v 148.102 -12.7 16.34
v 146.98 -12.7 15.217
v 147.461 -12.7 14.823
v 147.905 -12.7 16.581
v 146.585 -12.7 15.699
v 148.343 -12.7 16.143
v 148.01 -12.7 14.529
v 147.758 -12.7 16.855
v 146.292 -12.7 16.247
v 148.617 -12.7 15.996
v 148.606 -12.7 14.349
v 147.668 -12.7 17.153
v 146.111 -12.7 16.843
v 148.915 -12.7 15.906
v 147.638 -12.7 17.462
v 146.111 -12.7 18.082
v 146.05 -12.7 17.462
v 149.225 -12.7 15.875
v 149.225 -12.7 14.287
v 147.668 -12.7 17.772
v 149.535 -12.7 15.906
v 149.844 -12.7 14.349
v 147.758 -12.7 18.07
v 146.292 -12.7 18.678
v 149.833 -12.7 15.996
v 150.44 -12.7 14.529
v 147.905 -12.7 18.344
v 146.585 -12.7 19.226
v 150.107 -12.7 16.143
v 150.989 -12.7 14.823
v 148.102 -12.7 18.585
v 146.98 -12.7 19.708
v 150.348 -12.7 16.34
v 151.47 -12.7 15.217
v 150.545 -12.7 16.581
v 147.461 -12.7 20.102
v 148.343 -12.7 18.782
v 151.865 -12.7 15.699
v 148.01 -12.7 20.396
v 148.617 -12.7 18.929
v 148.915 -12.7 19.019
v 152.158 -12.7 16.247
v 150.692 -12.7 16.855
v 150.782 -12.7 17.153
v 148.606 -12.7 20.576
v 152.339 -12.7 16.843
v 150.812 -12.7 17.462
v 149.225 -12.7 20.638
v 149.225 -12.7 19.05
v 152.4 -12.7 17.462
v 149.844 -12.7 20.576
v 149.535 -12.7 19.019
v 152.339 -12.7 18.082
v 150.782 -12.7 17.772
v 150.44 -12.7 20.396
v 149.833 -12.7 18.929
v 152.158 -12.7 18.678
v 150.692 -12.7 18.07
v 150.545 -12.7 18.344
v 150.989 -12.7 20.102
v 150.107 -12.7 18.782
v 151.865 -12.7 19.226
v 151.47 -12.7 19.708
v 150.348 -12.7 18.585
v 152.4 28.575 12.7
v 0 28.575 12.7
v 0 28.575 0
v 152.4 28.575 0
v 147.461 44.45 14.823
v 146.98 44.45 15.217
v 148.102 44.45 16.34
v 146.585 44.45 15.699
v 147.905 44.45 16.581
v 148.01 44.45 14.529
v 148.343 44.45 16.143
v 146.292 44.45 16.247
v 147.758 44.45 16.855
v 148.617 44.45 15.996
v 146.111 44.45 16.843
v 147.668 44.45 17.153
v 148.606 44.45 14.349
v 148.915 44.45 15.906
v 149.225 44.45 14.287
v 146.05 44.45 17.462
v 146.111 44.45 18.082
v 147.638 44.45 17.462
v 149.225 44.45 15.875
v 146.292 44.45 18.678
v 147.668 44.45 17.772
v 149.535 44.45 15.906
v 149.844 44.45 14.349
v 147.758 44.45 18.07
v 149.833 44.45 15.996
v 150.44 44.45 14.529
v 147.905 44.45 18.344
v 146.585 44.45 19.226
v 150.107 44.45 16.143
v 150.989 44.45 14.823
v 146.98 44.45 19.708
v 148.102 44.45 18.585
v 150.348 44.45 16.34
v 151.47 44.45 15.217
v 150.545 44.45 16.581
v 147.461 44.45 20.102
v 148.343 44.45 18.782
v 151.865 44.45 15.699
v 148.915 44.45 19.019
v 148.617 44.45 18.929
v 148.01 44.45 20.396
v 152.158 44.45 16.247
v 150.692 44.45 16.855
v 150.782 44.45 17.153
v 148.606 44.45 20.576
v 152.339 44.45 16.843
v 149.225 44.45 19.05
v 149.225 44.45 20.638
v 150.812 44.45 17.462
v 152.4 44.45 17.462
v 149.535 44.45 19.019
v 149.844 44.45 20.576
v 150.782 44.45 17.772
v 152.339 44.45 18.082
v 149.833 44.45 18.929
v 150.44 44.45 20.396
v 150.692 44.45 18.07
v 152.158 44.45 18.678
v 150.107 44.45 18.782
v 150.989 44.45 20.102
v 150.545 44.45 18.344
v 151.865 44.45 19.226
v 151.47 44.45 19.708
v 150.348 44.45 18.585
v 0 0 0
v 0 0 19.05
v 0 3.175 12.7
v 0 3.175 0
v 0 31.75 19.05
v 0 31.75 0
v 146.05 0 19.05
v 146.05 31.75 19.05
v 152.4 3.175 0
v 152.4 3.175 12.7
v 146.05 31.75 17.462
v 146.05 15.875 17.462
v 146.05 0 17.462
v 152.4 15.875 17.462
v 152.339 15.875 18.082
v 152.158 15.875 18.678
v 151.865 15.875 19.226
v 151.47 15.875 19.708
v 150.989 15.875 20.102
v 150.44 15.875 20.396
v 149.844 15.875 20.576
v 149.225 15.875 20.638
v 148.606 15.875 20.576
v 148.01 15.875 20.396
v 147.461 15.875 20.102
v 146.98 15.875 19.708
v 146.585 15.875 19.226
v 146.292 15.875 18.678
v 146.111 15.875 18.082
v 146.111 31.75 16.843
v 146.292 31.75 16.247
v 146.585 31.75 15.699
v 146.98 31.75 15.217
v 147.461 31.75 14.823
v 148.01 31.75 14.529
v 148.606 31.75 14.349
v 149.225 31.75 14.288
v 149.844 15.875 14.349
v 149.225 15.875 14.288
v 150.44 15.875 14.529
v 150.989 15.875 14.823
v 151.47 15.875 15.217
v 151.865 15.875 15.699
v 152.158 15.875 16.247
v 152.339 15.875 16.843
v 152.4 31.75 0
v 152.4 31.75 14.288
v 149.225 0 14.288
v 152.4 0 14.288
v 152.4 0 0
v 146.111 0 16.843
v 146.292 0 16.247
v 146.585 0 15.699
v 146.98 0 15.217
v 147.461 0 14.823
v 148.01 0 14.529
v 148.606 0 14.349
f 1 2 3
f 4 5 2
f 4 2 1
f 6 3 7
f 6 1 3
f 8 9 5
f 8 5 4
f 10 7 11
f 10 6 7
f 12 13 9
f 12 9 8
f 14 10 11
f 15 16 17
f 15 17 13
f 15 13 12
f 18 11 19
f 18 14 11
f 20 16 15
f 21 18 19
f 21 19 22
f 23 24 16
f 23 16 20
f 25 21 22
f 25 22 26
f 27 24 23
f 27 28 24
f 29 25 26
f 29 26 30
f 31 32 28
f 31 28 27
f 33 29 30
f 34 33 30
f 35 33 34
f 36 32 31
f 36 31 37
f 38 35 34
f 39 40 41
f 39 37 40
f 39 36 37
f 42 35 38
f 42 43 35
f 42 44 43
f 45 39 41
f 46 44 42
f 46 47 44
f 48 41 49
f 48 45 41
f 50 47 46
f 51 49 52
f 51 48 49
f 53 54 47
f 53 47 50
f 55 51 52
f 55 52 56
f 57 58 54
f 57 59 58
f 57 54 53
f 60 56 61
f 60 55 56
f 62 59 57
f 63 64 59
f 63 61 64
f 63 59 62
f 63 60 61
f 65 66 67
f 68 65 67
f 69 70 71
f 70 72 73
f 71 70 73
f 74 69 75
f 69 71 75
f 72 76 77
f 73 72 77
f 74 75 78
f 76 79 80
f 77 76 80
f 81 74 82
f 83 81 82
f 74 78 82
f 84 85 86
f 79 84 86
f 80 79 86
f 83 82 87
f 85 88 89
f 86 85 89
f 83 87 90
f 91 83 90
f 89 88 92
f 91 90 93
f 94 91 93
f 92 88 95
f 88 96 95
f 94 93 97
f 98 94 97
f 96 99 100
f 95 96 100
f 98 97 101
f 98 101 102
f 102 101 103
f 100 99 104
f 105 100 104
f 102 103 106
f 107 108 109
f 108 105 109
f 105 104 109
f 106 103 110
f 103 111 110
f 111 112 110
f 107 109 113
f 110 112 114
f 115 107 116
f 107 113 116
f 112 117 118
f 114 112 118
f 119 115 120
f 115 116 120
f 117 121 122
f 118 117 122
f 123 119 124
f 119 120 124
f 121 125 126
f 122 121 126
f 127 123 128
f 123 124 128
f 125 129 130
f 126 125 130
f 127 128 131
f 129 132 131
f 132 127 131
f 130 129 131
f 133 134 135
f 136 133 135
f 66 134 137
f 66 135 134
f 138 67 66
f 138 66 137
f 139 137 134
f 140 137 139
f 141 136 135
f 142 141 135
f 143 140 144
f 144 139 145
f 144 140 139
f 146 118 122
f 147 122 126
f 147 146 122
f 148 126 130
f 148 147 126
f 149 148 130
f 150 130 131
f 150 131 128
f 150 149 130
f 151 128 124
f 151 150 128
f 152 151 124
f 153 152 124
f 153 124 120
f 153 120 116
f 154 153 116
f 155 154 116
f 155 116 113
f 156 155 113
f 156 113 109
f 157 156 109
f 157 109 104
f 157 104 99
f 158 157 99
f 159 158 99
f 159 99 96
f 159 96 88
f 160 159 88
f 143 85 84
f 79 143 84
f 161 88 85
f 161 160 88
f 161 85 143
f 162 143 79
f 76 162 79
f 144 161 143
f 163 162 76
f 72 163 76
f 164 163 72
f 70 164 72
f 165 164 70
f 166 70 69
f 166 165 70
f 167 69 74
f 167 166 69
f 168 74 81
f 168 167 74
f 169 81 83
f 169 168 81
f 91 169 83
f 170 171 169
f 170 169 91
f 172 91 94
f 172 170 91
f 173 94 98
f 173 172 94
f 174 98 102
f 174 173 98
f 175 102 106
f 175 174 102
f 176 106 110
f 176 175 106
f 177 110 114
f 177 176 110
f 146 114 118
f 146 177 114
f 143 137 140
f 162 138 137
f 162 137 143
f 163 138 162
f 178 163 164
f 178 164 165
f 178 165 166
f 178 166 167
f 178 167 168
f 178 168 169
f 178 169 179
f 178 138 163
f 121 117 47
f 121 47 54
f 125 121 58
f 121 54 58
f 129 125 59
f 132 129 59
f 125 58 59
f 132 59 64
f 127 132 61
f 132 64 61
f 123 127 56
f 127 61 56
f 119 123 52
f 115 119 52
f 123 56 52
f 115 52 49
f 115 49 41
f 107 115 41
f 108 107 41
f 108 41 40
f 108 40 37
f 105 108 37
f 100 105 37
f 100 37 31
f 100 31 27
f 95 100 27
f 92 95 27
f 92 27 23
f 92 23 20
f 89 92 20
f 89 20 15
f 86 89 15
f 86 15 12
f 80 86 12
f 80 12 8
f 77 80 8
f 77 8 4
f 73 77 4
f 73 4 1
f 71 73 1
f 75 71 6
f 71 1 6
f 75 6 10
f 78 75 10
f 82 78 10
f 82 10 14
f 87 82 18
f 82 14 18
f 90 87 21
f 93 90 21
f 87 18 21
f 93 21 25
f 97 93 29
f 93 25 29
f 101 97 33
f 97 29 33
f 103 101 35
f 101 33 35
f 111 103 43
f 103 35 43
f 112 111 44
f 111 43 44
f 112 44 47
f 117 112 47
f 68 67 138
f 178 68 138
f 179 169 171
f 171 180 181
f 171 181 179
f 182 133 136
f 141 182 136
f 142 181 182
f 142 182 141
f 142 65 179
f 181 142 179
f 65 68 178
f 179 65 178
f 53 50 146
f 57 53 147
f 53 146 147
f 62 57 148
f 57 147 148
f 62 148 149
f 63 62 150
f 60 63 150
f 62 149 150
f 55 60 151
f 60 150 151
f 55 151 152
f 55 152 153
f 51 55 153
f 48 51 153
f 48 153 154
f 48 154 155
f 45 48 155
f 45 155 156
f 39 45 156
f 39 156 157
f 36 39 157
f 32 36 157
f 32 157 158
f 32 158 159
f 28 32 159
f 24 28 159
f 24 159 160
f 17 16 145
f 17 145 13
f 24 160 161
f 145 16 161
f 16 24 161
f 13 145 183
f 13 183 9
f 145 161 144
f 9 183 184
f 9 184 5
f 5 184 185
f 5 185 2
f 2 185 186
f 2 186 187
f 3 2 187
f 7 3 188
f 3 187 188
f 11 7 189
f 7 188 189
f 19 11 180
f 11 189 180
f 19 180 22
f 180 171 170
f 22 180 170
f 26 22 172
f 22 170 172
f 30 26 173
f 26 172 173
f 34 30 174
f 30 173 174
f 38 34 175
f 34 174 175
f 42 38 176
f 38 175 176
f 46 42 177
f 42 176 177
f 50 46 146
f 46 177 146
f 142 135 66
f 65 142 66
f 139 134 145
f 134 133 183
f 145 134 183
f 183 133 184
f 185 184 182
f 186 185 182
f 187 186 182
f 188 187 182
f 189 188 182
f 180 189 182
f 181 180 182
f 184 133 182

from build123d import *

# Parameters (mm, degrees)
F1_DEPTH      = 152.4
F2_W          = 152.4
F2_H          = 31.75
F3_DEPTH      = 3.175
F5_DEPTH      = 31.751
F7_R          = 3.175
F8_DEPTH      = 28.575
F8_DEPTH_BACK = 28.575
F9_R          = 1.5875
F10_DEPTH     = 57.151


with BuildPart() as f1:
    # F0 (on Right) → F1 (new body)
    with BuildSketch(Plane.YZ):
        Polygon((0, 15.875), (0, 0), (3.175, 0), (3.175, 12.7), (28.575, 12.7), (28.575, 0), (31.75, 0), (31.75, 15.875), align=None)
    extrude(amount=F1_DEPTH)

    # F2 (on face) → F3 (join)
    with BuildSketch(Plane.XY.offset(15.875)):
        with Locations((76.2, 15.875)):
            Rectangle(F2_W, F2_H)
    extrude(amount=F3_DEPTH)

    # F4 (on face) → F5 (cut, through all)
    with BuildSketch(Plane.XZ):
        with BuildLine():
            Line((146.05, 19.05), (146.05, 17.4625))
            ThreePointArc((146.05, 17.4625), (146.979936, 15.217436), (149.225, 14.2875))
            Line((149.225, 14.2875), (152.4, 14.2875))
            Line((152.4, 14.2875), (152.4, 17.4625))
            Line((152.4, 17.4625), (152.4, 19.05))
            Line((152.4, 19.05), (151.974631, 19.05))
            Line((151.974631, 19.05), (146.05, 19.05))
        make_face()
    extrude(amount=-F5_DEPTH, mode=Mode.SUBTRACT)

    # F7 (on offset) → F8 (join, two sides)
    with BuildSketch(Plane.XZ.offset(-15.875)) as f8_sk:
        with Locations((149.225, 17.4625)):
            Circle(F7_R)
    extrude(amount=F8_DEPTH)
    extrude(f8_sk.sketch, amount=-F8_DEPTH_BACK)

    # F9 (on face) → F10 (cut, through all)
    with BuildSketch(Plane.XZ.offset(12.7)):
        with Locations((149.225, 17.4625)):
            Circle(F9_R)
    extrude(amount=-F10_DEPTH, mode=Mode.SUBTRACT)


solid = f1.part
